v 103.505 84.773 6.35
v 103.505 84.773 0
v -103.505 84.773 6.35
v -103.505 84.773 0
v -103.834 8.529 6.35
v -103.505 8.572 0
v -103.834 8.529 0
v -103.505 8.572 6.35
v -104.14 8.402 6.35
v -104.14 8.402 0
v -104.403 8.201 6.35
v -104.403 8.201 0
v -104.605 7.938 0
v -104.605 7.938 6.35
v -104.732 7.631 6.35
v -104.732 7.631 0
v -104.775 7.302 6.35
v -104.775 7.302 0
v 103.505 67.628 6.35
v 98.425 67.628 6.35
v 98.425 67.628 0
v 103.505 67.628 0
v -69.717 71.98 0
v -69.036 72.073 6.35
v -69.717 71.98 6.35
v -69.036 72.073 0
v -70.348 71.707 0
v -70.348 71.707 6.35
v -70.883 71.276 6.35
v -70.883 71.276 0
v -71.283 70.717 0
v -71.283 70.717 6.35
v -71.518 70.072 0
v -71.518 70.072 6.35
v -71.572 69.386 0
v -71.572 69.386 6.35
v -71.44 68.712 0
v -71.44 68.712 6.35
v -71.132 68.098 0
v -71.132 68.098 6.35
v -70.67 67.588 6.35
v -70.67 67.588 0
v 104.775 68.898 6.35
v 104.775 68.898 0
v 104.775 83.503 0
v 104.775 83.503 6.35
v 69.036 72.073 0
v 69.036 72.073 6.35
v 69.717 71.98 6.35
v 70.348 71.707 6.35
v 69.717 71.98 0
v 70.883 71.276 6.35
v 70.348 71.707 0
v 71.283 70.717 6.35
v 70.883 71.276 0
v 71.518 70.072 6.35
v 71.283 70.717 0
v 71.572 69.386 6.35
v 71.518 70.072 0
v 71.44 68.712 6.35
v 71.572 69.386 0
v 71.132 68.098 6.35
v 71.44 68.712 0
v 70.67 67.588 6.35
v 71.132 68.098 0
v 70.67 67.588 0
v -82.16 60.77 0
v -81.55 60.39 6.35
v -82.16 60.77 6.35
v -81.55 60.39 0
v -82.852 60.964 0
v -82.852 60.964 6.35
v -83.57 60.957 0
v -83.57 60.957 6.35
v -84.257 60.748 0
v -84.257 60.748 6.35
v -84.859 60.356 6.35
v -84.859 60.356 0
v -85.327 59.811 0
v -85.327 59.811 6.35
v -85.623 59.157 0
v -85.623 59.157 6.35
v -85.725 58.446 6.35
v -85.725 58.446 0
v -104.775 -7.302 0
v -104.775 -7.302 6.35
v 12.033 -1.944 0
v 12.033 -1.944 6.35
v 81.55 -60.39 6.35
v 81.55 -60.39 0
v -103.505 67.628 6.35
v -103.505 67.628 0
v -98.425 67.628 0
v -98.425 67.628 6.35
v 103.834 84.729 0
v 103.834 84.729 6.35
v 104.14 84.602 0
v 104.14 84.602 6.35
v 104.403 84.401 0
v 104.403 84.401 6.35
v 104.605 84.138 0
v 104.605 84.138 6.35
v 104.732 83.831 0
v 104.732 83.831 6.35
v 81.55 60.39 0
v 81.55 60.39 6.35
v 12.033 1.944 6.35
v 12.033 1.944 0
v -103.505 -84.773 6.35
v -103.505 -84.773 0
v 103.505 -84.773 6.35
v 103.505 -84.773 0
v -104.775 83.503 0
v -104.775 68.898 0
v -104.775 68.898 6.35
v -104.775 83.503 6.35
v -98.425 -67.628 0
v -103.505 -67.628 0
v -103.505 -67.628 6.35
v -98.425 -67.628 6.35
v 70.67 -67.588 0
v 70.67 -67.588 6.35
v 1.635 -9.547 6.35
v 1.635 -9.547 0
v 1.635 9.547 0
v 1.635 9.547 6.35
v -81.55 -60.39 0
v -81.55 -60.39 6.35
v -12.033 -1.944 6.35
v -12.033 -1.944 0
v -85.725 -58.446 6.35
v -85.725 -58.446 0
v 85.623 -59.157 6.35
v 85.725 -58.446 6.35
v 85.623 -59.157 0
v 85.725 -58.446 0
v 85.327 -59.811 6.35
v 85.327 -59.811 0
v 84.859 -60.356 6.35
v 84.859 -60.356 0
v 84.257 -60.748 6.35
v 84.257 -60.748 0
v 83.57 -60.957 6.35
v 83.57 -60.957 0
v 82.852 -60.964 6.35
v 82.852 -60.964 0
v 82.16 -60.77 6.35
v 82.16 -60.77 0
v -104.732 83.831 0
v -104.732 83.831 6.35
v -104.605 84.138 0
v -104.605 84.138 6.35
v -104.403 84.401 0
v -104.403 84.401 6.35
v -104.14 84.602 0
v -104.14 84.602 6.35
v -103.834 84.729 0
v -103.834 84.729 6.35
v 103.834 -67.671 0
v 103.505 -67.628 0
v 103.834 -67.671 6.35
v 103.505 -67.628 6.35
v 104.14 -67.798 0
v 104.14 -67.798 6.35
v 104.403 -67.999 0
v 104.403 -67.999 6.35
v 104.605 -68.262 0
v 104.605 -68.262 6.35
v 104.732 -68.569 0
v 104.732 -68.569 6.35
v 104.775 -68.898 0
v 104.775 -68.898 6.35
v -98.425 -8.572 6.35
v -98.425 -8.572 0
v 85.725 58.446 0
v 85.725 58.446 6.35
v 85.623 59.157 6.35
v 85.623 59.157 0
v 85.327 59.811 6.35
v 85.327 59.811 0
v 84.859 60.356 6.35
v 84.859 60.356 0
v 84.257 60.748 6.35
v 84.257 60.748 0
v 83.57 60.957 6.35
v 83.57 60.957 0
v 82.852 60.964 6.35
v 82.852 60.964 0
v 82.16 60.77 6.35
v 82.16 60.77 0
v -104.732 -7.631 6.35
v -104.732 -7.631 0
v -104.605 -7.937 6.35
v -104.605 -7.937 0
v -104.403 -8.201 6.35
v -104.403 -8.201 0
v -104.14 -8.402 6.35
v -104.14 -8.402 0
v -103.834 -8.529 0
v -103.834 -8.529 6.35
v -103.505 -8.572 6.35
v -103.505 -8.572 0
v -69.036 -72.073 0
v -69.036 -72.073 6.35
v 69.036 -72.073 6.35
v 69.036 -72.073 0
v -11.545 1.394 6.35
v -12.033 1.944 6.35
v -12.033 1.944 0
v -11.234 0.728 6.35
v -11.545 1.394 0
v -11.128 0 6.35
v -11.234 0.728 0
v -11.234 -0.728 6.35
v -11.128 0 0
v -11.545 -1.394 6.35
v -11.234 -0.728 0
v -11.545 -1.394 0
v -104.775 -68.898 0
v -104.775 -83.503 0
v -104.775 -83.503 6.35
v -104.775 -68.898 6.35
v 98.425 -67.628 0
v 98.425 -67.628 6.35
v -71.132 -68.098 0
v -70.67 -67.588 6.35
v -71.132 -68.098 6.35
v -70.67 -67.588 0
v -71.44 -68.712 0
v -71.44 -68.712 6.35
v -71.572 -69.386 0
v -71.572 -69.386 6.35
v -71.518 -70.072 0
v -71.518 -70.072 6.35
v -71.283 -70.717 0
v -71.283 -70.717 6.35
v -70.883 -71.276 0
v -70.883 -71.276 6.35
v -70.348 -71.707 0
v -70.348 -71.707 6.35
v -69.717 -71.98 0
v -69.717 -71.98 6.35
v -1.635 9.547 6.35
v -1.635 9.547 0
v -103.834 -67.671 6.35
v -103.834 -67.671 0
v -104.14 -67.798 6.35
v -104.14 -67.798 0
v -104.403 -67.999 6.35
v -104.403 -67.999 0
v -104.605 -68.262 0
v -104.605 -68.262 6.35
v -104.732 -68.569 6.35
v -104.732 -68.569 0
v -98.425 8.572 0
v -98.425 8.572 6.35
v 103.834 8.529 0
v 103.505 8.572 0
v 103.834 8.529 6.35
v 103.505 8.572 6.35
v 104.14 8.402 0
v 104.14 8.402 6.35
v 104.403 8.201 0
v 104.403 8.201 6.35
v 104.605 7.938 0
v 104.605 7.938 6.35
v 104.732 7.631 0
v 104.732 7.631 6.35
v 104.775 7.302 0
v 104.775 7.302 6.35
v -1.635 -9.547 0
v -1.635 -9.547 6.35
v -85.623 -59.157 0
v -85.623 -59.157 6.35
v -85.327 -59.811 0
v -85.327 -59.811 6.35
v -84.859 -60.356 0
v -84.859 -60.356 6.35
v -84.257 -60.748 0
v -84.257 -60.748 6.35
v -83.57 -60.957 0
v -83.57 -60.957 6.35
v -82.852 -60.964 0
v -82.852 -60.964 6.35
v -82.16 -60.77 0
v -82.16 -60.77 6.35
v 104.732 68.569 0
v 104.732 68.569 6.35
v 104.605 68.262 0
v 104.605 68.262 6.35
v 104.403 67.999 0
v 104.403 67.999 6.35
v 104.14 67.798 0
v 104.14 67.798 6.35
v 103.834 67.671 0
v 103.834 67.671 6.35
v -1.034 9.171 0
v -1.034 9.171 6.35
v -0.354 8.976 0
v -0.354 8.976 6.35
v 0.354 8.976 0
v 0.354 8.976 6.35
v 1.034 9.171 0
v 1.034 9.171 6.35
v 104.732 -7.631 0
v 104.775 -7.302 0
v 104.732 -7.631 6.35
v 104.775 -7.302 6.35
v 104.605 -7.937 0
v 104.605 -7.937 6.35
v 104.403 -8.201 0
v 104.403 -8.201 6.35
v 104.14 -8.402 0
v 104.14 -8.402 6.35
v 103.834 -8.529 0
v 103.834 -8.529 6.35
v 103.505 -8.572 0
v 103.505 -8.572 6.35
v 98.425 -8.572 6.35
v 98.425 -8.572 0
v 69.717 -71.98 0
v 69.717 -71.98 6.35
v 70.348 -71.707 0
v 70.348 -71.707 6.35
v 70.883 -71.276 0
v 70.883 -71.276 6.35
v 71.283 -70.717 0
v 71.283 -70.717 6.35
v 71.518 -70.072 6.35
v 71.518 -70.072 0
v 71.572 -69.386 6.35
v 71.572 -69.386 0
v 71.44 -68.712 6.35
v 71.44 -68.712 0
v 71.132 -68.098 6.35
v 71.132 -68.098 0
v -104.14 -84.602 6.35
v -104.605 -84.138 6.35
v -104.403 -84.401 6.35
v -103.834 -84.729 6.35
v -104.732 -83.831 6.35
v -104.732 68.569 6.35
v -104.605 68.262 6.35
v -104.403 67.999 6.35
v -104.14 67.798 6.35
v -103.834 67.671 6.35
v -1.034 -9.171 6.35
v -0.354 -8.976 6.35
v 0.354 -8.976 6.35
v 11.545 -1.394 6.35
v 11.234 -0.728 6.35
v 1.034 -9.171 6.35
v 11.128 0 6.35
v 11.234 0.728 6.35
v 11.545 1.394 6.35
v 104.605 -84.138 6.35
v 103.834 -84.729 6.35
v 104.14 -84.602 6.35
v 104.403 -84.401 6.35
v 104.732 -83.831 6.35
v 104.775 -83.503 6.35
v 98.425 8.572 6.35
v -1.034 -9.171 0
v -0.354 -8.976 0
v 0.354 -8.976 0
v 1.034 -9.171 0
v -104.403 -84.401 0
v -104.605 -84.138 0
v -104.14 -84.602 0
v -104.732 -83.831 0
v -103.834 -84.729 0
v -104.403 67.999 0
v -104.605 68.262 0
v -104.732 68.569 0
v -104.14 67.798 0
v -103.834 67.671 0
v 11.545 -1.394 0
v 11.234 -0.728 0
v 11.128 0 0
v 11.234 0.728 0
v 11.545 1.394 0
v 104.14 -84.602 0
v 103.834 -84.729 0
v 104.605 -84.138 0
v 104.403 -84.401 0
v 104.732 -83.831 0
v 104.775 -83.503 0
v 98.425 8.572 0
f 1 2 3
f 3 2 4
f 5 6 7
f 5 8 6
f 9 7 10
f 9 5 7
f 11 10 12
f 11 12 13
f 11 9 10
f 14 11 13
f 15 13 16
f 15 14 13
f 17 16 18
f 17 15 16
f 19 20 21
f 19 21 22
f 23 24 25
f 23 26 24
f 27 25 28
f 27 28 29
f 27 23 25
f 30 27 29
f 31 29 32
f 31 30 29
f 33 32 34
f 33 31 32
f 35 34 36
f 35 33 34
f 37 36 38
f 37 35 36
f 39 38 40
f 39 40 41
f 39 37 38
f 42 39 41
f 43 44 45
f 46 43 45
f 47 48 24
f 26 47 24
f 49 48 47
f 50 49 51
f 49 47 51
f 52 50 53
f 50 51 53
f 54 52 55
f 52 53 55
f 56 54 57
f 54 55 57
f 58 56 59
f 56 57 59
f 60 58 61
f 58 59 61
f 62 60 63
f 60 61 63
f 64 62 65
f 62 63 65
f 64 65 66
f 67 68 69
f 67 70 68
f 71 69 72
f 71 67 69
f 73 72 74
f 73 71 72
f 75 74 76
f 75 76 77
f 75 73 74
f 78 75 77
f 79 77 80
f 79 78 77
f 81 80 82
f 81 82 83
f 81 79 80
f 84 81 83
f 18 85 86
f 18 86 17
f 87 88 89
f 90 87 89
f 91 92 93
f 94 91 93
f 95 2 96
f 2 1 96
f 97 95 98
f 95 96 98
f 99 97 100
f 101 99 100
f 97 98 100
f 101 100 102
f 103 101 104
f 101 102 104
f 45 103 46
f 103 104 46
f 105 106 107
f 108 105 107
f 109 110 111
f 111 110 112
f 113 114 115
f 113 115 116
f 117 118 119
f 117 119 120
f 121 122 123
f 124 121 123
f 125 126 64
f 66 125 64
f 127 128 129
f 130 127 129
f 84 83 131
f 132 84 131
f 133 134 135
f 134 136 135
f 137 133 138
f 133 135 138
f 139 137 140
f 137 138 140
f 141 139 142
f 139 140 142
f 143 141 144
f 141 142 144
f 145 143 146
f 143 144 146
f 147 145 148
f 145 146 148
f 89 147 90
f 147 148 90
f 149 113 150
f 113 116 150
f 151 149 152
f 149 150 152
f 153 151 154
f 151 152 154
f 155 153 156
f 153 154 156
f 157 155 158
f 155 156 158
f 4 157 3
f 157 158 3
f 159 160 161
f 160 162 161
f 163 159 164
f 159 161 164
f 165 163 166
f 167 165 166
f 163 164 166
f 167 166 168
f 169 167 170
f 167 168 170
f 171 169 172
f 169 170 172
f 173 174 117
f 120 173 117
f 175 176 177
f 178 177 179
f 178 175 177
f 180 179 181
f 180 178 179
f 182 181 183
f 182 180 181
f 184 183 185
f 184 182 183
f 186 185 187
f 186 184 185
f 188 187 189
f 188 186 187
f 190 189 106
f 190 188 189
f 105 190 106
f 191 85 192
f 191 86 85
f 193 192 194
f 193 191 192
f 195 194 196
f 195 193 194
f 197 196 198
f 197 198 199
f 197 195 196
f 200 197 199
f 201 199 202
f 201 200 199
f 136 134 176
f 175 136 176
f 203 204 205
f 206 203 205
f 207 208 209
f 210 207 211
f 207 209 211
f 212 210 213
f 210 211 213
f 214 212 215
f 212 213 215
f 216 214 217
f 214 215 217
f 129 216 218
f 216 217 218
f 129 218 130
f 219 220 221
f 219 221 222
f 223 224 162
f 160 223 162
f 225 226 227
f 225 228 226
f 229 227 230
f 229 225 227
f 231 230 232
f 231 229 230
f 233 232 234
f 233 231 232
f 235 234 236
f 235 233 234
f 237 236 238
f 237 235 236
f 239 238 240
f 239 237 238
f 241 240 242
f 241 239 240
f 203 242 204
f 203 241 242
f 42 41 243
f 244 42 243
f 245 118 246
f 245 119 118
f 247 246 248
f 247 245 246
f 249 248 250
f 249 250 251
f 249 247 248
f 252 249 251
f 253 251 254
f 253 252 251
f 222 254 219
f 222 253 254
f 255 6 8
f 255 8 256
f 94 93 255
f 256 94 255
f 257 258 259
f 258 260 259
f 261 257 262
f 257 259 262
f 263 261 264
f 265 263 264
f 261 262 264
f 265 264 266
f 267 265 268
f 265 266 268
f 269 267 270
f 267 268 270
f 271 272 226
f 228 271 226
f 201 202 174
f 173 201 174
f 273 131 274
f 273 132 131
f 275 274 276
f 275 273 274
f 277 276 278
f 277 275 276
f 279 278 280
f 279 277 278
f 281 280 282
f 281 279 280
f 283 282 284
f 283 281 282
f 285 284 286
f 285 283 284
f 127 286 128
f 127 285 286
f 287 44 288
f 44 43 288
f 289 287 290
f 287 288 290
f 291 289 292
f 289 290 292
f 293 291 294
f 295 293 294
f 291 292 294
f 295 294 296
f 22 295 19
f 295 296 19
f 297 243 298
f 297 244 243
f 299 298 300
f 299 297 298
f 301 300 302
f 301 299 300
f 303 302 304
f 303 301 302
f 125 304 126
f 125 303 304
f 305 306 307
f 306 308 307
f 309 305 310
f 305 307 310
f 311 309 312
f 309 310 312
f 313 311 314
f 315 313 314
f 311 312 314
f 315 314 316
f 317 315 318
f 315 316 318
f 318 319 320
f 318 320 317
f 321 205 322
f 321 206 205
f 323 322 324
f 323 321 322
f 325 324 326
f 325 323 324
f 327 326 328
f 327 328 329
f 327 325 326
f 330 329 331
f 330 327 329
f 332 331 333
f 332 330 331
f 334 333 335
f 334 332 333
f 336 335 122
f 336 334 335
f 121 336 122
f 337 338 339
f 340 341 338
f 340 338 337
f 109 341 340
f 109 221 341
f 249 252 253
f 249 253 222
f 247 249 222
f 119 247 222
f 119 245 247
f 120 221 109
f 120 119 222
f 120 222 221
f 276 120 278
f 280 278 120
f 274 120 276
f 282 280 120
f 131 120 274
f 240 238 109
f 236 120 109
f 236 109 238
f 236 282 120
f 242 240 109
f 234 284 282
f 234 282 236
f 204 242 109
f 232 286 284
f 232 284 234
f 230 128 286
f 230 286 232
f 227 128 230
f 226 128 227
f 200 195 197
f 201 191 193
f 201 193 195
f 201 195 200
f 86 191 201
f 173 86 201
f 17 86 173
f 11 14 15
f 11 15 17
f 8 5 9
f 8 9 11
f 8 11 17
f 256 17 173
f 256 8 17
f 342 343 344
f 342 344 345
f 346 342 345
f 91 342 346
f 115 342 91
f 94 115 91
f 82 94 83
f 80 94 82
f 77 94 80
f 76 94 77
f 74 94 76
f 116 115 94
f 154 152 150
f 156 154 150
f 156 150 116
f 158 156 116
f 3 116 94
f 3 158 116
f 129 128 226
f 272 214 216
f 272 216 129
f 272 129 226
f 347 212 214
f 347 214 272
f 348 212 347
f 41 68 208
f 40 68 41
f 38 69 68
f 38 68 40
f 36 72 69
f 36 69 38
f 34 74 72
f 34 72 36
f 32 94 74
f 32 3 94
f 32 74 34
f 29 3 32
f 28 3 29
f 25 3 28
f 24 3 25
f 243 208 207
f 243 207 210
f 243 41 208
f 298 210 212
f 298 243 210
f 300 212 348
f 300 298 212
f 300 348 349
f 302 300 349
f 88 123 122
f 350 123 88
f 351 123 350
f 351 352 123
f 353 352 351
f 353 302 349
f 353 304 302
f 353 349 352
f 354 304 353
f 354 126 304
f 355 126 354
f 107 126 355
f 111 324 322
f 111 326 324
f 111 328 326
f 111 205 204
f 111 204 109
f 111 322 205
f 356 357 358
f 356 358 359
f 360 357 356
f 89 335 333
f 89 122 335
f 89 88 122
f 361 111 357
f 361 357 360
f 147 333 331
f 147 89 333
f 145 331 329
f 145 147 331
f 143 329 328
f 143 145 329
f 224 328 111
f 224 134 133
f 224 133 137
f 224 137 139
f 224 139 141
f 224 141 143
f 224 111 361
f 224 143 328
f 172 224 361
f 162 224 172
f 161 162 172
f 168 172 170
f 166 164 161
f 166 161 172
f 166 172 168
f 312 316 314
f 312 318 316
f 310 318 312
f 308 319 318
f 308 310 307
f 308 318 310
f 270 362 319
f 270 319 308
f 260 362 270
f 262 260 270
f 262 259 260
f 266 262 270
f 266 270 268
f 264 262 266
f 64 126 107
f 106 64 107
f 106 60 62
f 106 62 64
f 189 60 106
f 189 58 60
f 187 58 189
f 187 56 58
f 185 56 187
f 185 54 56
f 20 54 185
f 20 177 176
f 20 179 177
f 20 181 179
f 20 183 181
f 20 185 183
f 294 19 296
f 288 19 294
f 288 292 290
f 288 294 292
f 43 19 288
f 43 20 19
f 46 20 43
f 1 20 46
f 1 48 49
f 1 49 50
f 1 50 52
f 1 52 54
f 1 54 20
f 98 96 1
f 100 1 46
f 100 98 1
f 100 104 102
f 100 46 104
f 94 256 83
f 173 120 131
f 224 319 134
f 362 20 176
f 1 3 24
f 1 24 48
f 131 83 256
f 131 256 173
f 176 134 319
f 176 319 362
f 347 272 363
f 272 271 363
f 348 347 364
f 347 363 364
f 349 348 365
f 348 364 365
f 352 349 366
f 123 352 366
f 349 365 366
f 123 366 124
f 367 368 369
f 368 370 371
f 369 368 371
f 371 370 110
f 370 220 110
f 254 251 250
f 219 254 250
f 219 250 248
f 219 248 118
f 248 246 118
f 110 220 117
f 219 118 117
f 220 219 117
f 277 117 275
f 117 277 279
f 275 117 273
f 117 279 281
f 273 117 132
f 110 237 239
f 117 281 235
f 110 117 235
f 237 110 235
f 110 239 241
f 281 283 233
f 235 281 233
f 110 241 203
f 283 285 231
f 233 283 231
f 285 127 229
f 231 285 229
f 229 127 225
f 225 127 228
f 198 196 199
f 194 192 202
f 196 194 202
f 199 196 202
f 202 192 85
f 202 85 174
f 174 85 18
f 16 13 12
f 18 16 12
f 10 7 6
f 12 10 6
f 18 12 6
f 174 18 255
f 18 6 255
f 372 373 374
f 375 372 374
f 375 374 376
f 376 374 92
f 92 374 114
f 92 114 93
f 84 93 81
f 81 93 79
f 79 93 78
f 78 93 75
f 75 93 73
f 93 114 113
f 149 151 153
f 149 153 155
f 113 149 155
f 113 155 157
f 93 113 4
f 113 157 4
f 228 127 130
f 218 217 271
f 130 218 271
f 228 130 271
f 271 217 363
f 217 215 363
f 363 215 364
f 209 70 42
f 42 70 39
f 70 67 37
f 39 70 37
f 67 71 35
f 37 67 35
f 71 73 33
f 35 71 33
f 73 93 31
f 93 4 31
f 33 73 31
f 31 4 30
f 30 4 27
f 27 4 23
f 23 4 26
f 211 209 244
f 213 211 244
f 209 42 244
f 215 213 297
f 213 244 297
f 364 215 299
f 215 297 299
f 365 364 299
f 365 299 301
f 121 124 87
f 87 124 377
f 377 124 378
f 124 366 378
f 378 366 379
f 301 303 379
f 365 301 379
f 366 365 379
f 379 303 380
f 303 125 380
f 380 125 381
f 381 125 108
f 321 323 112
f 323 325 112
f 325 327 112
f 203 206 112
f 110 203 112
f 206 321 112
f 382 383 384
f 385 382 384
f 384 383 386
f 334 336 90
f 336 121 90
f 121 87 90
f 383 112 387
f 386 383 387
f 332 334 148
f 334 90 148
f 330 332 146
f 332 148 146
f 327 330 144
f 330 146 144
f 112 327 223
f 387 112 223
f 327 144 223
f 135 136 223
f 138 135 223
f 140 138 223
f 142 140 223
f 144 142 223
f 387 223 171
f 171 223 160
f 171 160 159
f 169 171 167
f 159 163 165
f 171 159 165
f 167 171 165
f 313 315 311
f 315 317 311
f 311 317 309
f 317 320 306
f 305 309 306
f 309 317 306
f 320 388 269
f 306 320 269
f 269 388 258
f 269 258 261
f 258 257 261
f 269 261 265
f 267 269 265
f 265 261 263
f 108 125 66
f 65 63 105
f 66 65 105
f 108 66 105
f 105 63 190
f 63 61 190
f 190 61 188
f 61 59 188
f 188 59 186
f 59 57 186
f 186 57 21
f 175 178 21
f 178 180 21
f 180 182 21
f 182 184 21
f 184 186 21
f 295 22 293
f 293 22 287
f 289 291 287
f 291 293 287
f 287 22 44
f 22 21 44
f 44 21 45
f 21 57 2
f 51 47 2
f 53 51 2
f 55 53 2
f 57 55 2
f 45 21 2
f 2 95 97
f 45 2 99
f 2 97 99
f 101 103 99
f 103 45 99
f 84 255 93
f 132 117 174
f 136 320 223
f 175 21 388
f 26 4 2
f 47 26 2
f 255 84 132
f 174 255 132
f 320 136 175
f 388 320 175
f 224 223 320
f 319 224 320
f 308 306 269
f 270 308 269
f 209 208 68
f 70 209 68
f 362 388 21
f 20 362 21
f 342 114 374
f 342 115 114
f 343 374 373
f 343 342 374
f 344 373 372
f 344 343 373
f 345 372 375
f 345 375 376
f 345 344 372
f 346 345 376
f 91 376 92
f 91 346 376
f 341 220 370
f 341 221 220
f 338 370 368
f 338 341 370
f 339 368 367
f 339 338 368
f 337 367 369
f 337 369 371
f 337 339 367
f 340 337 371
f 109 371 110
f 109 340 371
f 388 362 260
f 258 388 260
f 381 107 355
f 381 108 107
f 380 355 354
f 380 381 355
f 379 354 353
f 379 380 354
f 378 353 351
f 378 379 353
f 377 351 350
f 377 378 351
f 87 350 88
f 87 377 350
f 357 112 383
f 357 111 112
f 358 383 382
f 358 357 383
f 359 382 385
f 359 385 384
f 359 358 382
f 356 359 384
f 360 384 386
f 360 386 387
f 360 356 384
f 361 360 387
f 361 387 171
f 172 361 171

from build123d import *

# Parameters (mm, degrees)
SKETCH2_W           = 6.35
SKETCH2_H           = 17.145
BOSS_EXTRUDE1_DEPTH = 6.35
CUT_EXTRUDE1_DEPTH  = 135.924052271
FILLET1_R           = 2.54
FILLET2_R           = 1.27


with BuildPart() as part:
    # Sketch2 → Boss-Extrude1 (new body)
    with BuildSketch(Plane.XY):
        Polygon((98.425, 84.7725), (-98.425, 84.7725), (-98.425, 67.6275), (-98.425, 8.5725), (-98.425, -8.5725), (-98.425, -67.6275), (-98.425, -84.7725), (98.425, -84.7725), (98.425, -67.6275), (98.425, -8.5725), (98.425, 8.5725), (98.425, 67.6275), align=None)
        with Locations((-101.6, 76.2)):
            Rectangle(SKETCH2_W, SKETCH2_H)
        with Locations((-101.6, 0)):
            Rectangle(SKETCH2_W, SKETCH2_H)
        with Locations((101.6, 76.2)):
            Rectangle(SKETCH2_W, SKETCH2_H)
        with Locations((101.6, 0)):
            Rectangle(SKETCH2_W, SKETCH2_H)
        with Locations((101.6, -76.2)):
            Rectangle(SKETCH2_W, SKETCH2_H)
        with Locations((-101.6, -76.2)):
            Rectangle(SKETCH2_W, SKETCH2_H)
    extrude(amount=BOSS_EXTRUDE1_DEPTH)

    # Sketch3 → Cut-Extrude1 (cut, through all)
    with BuildSketch(Plane.XY.offset(6.35)):
        Polygon((-9.72090457, 0), (-85.725, 63.899739491), (-85.725, -63.899739491), align=None)
        Polygon((76.00409543, 72.0725), (-76.00409543, 72.0725), (0, 8.172760509), align=None)
        Polygon((85.725, -63.899739491), (85.725, 63.899739491), (9.72090457, 0), align=None)
        Polygon((0, -8.172760509), (-76.00409543, -72.0725), (76.00409543, -72.0725), align=None)
    extrude(amount=-CUT_EXTRUDE1_DEPTH, mode=Mode.SUBTRACT)

    # Fillet1
    fillet1_edges = [part.edges().sort_by_distance(p)[0] for p in [
        (85.725, 63.899739491, 3.175),
        (85.725, -63.899739491, 3.175),
        (9.72090457, 0, 3.175),
        (76.00409543, 72.0725, 3.175),
        (0, 8.172760509, 3.175),
        (-76.00409543, 72.0725, 3.175),
        (0, -8.172760509, 3.175),
        (76.00409543, -72.0725, 3.175),
        (-76.00409543, -72.0725, 3.175),
        (-9.72090457, 0, 3.175),
        (-85.725, -63.899739491, 3.175),
        (-85.725, 63.899739491, 3.175),
    ]]
    fillet(fillet1_edges, radius=FILLET1_R)

    # Fillet2
    fillet2_edges = [part.edges().sort_by_distance(p)[0] for p in [
        (104.775, 8.5725, 3.175),
        (104.775, -8.5725, 3.175),
        (104.775, -67.6275, 3.175),
        (104.775, -84.7725, 3.175),
        (-104.775, -8.5725, 3.175),
        (-104.775, 8.5725, 3.175),
        (-104.775, 67.6275, 3.175),
        (-104.775, 84.7725, 3.175),
        (104.775, 84.7725, 3.175),
        (104.775, 67.6275, 3.175),
        (-104.775, -67.6275, 3.175),
        (-104.775, -84.7725, 3.175),
    ]]
    fillet(fillet2_edges, radius=FILLET2_R)


solid = part.part
